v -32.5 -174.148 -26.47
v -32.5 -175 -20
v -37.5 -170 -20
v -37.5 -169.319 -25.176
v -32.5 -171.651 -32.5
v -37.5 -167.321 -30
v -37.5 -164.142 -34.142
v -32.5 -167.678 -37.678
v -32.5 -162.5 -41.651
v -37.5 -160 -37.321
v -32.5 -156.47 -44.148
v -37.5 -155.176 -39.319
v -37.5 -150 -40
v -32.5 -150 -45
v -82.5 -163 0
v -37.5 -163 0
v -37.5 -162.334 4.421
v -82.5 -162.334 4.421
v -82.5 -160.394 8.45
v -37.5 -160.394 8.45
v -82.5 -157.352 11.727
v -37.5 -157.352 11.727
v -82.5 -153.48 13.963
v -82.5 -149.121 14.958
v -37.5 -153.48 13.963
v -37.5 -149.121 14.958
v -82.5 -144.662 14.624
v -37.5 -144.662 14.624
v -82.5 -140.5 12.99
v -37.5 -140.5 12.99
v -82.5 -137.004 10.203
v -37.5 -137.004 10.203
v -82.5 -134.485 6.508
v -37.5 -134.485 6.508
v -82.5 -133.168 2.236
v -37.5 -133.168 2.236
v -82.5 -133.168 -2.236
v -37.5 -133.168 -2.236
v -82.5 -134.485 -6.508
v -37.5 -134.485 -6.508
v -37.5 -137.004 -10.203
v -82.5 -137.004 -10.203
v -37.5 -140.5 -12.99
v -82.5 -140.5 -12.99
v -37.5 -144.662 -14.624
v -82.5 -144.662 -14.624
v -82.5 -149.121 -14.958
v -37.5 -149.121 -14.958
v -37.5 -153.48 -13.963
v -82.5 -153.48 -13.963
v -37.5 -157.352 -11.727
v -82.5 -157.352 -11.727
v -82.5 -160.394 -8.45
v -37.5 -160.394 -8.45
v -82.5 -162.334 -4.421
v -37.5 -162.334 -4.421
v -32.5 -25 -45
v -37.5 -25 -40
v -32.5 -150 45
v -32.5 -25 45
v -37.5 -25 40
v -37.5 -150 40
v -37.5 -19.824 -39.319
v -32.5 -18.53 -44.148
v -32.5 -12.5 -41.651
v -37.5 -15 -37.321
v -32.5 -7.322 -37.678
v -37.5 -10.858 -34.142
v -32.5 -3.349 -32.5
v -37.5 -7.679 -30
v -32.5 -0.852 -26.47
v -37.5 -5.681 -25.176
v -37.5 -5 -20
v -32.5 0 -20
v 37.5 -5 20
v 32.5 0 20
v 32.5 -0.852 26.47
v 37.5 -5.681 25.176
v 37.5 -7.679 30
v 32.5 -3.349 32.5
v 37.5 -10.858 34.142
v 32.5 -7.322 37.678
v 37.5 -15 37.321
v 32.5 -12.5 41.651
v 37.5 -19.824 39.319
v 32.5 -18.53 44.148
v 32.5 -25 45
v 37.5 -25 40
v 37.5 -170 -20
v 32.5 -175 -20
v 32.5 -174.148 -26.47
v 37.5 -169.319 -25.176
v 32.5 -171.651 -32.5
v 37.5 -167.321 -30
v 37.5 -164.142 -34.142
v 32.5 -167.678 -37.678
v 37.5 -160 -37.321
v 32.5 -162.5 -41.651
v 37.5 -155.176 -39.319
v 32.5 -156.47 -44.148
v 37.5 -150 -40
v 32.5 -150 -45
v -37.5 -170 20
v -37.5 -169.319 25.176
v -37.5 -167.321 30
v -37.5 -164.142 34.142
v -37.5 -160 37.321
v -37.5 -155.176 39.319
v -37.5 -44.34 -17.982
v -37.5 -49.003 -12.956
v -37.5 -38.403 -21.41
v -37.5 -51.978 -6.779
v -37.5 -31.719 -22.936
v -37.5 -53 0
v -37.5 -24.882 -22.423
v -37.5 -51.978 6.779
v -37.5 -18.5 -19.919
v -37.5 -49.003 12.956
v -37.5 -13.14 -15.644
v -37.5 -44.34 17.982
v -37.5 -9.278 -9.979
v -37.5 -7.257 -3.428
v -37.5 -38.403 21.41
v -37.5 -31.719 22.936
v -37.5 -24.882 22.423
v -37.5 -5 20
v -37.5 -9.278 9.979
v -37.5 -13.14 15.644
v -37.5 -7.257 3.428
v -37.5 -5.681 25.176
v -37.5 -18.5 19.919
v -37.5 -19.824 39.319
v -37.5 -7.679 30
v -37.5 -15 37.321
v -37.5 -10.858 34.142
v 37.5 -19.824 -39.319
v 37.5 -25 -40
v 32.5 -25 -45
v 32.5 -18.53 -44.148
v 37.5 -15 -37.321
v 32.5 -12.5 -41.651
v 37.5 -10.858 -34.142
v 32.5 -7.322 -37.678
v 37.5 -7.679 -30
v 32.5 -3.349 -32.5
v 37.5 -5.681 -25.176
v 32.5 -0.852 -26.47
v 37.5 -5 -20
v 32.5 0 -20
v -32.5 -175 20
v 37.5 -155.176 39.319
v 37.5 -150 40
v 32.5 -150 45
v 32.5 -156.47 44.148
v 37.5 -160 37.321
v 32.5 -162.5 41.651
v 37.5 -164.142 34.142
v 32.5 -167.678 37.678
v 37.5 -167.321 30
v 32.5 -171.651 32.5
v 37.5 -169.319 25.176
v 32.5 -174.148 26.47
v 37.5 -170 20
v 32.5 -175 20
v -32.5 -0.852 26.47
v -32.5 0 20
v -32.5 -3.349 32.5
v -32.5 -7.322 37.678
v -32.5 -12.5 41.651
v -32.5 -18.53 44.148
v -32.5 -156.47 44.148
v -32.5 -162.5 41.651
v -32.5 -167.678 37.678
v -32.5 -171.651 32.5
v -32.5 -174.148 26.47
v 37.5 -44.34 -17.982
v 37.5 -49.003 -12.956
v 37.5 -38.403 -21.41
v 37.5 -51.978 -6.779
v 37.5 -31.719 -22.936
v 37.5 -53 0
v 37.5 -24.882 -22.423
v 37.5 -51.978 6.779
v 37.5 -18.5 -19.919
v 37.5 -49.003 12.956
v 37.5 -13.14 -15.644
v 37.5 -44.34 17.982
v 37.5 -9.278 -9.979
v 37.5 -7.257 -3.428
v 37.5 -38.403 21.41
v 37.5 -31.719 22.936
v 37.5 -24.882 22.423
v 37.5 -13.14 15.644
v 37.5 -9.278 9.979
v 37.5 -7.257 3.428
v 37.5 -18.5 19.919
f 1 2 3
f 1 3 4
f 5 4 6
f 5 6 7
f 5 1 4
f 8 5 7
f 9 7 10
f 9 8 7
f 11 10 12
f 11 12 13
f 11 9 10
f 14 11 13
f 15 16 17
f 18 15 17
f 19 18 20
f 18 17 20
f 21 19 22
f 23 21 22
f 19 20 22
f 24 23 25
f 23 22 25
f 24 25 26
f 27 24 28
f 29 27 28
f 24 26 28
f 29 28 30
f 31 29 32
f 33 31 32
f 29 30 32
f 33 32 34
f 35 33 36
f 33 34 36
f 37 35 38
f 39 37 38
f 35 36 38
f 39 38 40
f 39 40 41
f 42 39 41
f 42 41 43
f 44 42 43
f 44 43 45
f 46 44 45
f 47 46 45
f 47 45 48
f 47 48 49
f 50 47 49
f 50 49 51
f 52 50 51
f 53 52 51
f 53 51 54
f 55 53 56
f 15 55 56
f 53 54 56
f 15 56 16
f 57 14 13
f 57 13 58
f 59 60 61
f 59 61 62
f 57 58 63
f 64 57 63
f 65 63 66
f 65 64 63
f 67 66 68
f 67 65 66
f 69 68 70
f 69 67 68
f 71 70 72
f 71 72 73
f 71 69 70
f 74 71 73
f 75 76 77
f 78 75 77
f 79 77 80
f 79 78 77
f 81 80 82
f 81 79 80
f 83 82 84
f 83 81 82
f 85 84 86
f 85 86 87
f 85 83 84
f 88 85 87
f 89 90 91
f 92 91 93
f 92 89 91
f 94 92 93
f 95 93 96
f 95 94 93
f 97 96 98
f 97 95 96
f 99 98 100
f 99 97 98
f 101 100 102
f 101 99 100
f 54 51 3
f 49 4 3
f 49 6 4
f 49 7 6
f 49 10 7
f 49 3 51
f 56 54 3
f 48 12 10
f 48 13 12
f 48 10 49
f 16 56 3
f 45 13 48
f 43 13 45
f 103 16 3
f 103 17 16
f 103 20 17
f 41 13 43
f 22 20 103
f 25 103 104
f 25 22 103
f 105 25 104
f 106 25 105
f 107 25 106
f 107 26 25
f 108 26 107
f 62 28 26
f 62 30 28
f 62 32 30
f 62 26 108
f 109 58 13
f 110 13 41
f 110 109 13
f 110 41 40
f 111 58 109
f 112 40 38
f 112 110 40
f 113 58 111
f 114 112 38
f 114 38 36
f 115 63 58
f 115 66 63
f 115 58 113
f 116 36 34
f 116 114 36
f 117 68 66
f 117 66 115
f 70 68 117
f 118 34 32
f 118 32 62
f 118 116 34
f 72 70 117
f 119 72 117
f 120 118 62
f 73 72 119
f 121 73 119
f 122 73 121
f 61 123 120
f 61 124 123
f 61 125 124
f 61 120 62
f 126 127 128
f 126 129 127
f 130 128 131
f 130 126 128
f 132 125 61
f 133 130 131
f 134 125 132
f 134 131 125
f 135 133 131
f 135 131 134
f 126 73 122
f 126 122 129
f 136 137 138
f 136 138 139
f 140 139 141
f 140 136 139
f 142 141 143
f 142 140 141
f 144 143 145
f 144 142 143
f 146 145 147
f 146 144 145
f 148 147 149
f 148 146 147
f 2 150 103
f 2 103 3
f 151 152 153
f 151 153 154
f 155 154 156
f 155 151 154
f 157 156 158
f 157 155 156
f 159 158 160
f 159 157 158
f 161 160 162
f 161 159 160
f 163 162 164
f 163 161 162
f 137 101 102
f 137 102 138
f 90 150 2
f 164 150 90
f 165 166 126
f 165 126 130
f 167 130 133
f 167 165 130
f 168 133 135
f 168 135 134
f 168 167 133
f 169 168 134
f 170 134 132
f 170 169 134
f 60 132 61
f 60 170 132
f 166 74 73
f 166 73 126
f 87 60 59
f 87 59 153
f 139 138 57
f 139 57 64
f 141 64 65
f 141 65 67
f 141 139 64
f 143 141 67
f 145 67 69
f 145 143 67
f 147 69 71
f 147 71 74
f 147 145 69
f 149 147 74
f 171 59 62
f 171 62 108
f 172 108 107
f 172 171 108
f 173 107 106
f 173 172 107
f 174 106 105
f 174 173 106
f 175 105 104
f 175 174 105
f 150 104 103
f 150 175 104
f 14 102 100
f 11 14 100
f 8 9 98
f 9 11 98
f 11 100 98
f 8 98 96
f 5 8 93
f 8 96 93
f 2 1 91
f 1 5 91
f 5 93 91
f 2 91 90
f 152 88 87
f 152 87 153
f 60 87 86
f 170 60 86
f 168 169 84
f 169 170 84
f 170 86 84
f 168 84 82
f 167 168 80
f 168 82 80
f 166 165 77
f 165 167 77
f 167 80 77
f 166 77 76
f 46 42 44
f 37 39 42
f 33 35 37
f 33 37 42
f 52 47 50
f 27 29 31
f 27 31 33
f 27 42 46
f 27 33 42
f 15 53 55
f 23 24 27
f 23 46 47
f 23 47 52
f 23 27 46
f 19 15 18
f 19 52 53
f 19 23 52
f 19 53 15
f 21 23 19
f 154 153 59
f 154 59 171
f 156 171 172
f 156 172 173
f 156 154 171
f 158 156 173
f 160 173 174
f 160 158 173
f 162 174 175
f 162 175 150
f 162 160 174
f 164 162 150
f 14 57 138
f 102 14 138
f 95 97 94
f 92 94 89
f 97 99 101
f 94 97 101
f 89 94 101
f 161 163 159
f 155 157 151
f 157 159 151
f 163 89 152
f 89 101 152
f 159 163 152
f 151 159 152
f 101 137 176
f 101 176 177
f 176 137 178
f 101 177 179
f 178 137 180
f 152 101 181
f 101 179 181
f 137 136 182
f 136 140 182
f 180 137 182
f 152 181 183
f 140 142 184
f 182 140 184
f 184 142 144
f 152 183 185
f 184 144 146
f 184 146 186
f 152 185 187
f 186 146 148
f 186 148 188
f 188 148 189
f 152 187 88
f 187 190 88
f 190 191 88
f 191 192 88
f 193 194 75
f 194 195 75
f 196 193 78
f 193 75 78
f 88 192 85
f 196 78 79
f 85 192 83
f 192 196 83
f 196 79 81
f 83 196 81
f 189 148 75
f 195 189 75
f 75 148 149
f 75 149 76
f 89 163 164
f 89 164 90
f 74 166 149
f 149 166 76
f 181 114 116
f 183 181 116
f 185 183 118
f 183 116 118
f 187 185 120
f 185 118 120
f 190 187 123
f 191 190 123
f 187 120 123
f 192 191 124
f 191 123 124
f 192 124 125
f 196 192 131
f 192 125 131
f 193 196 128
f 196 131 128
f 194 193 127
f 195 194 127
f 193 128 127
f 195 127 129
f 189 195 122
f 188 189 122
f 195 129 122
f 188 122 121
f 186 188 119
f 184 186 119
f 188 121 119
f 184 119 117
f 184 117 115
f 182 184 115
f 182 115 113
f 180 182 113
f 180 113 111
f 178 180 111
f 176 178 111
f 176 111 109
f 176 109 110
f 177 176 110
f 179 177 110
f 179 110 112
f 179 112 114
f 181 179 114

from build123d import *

# Parameters (mm, degrees)
F0_W     = 75
F0_H     = 90
F1_DEPTH = 175
F2_R     = 25
F3_SIZE  = 5
F4_R     = 23
F5_DEPTH = 75.001
F6_R     = 15
F7_DEPTH = 45


with BuildPart() as f1:
    # F0 (on Front) → F1 (new body)
    with BuildSketch(Plane.XZ):
        Rectangle(F0_W, F0_H)
    extrude(amount=F1_DEPTH)

    # F2
    f2_edges = [f1.edges().sort_by_distance(p)[0] for p in [
        (0, 0, 45),
        (0, 0, -45),
        (0, -175, -45),
        (0, -175, 45),
    ]]
    fillet(f2_edges, radius=F2_R)

    # F3
    f3_edges = [f1.edges().sort_by_distance(p)[0] for p in [
        (-37.5, -87.5, 45),
        (37.5, -167.67767, 37.67767),
    ]]
    chamfer(f3_edges, length=F3_SIZE)

    # F4 (on face) → F5 (cut, through all)
    with BuildSketch(Plane(origin=(-37.5, 0, 0), x_dir=(0, -1, 0), z_dir=(-1, 0, 0))):
        with Locations((30, 0)):
            Circle(F4_R)
    extrude(amount=-F5_DEPTH, mode=Mode.SUBTRACT)

    # F6 (on face) → F7 (join)
    with BuildSketch(Plane(origin=(-37.5, 0, 0), x_dir=(0, -1, 0), z_dir=(-1, 0, 0))):
        with Locations((148, 0)):
            Circle(F6_R)
    extrude(amount=F7_DEPTH)


solid = f1.part
